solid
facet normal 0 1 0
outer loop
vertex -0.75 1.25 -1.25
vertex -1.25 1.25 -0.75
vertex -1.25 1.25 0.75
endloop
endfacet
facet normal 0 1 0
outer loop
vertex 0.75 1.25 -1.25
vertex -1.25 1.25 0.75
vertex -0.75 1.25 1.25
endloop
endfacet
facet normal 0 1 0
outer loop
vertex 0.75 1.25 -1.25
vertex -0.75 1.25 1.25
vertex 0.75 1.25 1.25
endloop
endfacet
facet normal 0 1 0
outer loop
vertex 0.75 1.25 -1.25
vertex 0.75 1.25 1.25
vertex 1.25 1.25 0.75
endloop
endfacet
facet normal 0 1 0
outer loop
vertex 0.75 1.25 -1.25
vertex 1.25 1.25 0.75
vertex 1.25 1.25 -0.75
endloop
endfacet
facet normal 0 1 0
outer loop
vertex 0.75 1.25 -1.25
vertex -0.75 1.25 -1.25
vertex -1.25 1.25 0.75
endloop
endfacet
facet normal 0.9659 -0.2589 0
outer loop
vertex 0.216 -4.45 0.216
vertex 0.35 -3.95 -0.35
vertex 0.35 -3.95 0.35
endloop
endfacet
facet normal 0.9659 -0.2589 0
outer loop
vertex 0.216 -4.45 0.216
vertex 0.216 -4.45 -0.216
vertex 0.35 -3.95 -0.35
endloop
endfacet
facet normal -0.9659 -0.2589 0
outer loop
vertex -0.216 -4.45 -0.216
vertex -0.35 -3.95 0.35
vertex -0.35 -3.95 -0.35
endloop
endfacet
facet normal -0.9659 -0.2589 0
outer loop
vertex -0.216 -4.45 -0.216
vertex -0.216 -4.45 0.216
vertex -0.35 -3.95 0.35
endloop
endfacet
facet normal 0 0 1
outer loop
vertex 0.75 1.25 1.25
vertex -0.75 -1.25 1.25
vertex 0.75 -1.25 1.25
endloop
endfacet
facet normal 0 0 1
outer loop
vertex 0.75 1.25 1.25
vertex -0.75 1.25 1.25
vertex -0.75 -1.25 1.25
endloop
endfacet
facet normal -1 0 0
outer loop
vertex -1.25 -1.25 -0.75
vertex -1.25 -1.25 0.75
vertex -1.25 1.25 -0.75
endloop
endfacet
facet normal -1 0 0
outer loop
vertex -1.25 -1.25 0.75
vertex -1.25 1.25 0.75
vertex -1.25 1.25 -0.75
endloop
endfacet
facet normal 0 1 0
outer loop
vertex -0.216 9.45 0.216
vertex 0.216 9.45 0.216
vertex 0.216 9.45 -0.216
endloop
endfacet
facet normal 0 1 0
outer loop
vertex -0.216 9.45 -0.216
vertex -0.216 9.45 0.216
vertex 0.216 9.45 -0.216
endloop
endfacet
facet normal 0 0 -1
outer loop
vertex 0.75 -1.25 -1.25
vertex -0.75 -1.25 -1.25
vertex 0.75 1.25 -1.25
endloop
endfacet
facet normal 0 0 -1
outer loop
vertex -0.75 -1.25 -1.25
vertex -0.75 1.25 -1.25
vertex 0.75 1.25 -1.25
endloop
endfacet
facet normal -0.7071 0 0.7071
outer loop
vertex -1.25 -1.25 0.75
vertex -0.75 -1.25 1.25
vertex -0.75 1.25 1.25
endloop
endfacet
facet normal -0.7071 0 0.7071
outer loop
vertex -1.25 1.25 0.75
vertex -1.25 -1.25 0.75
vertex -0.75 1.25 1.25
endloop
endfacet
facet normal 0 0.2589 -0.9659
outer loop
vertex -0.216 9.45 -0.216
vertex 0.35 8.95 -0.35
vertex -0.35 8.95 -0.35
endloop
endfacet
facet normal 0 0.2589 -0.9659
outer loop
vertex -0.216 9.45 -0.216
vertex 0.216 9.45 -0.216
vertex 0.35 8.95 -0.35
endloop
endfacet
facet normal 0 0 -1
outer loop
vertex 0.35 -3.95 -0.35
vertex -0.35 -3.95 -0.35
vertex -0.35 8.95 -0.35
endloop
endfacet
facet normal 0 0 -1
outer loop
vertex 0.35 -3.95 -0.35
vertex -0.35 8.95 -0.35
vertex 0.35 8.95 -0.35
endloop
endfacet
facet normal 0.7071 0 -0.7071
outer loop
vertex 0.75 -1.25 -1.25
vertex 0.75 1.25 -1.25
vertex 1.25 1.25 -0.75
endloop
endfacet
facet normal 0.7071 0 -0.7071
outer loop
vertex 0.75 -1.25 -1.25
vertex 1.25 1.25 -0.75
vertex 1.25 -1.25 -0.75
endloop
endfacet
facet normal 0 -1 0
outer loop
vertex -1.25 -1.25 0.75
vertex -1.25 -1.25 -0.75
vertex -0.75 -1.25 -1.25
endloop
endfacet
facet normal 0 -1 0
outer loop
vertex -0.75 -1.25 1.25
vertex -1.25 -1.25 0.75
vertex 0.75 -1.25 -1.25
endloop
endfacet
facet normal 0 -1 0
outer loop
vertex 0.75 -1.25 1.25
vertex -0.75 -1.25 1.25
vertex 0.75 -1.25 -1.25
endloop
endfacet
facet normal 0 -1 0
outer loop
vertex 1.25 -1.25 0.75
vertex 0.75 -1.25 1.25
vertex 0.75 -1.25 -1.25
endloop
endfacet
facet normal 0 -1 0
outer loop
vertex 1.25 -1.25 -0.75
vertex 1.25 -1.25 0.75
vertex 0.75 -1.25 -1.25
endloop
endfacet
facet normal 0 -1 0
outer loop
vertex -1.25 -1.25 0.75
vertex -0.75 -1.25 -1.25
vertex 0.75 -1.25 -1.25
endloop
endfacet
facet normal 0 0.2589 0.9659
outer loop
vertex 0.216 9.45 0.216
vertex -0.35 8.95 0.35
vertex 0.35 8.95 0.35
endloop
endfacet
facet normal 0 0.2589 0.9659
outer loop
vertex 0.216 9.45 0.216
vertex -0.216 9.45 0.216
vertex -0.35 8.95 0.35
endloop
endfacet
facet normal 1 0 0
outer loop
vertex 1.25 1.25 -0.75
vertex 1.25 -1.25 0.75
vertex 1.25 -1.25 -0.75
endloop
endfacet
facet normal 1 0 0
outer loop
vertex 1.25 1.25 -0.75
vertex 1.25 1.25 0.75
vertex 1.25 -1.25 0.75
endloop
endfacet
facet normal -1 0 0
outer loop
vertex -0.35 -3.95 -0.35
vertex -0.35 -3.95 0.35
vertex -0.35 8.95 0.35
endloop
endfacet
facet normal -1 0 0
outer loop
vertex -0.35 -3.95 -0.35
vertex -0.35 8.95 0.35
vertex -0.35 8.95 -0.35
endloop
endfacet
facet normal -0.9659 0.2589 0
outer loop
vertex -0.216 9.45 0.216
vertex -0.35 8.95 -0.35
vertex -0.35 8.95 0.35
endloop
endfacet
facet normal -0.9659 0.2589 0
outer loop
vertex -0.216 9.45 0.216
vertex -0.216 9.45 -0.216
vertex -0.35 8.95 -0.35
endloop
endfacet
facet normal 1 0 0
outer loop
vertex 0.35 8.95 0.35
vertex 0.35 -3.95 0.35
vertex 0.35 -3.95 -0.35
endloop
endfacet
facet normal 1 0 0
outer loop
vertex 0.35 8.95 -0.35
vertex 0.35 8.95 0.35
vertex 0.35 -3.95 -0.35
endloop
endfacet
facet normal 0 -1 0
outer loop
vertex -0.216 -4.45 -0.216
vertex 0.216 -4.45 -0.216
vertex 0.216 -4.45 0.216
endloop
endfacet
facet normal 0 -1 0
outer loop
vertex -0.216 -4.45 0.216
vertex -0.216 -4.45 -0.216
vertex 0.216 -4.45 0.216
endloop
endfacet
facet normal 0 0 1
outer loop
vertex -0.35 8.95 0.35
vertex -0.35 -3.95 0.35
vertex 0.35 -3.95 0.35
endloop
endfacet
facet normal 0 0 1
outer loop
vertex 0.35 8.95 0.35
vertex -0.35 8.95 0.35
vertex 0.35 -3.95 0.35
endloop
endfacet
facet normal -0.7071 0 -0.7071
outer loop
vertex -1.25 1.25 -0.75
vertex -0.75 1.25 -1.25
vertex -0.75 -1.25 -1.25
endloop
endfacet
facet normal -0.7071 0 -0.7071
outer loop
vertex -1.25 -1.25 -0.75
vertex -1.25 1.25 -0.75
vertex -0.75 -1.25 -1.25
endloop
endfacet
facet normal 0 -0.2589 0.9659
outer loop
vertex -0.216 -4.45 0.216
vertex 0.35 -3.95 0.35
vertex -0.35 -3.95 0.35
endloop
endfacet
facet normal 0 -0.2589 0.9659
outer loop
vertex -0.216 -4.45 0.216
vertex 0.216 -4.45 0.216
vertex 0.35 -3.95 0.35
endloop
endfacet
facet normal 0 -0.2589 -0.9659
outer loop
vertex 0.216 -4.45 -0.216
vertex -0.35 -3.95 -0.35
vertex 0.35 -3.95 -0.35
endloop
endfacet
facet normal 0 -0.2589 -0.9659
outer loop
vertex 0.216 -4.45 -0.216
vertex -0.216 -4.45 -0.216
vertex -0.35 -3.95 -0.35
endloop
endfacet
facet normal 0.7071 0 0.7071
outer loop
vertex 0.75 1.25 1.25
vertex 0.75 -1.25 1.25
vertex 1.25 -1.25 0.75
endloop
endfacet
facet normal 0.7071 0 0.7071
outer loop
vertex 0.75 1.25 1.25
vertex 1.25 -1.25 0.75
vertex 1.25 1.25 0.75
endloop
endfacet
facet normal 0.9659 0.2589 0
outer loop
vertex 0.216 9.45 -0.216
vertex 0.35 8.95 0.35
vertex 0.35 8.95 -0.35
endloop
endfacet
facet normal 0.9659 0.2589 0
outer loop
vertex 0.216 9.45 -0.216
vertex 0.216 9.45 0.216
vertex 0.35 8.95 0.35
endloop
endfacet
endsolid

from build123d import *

# Parameters (mm, degrees)
SKETCH3_W                = 2.5
SKETCH3_H                = 2.5
BOSS_EXTRUDE1_DEPTH      = 1.25
CHAMFER1_SIZE            = 0.5
BOSS_EXTRUDE2_DEPTH      = 7.7
BOSS_EXTRUDE2_DEPTH_BACK = 5.2
SKETCH5_W                = 0.7
SKETCH5_H                = 0.7
SKETCH6_W                = 0.7
SKETCH6_H                = 0.7
BOSS_EXTRUDE3_DEPTH      = 0.5
BOSS_EXTRUDE3_TAPER      = 15
SKETCH7_W                = 0.7
SKETCH7_H                = 0.7
BOSS_EXTRUDE4_DEPTH      = 0.5
BOSS_EXTRUDE4_TAPER      = 15


with BuildPart() as part:
    # Sketch3 → Boss-Extrude1 (new, symmetric)
    with BuildSketch(Plane(origin=(0, 0, 0), x_dir=(1, 0, 0), z_dir=(0, 1, 0))):
        Rectangle(SKETCH3_W, SKETCH3_H)
    extrude(amount=BOSS_EXTRUDE1_DEPTH, both=True)

    # Chamfer1
    chamfer1_edges = [part.edges().sort_by_distance(p)[0] for p in [
        (1.25, 0, 1.25),
        (-1.25, 0, 1.25),
        (-1.25, 0, -1.25),
        (1.25, 0, -1.25),
    ]]
    chamfer(chamfer1_edges, length=CHAMFER1_SIZE)


with BuildPart() as body_2:
    # Sketch5 → Boss-Extrude2 (new, two sides: drawn at the far end of the back side and taken through both)
    with BuildSketch(Plane(origin=(0, 1.25, 0), x_dir=(1, 0, 0), z_dir=(0, 1, 0)).offset(-BOSS_EXTRUDE2_DEPTH_BACK)):
        Rectangle(SKETCH5_W, SKETCH5_H)
    extrude(amount=BOSS_EXTRUDE2_DEPTH + BOSS_EXTRUDE2_DEPTH_BACK)

    # Sketch6 → Boss-Extrude3 (add)
    with BuildSketch(Plane(origin=(0, 8.95, 0), x_dir=(1, 0, 0), z_dir=(0, 1, 0))):
        Rectangle(SKETCH6_W, SKETCH6_H)
    extrude(amount=BOSS_EXTRUDE3_DEPTH, taper=BOSS_EXTRUDE3_TAPER)

    # Sketch7 → Boss-Extrude4 (add)
    with BuildSketch(Plane.XZ.offset(3.95)):
        Rectangle(SKETCH7_W, SKETCH7_H)
    extrude(amount=BOSS_EXTRUDE4_DEPTH, taper=BOSS_EXTRUDE4_TAPER)


solid = Compound([part.part, body_2.part])
